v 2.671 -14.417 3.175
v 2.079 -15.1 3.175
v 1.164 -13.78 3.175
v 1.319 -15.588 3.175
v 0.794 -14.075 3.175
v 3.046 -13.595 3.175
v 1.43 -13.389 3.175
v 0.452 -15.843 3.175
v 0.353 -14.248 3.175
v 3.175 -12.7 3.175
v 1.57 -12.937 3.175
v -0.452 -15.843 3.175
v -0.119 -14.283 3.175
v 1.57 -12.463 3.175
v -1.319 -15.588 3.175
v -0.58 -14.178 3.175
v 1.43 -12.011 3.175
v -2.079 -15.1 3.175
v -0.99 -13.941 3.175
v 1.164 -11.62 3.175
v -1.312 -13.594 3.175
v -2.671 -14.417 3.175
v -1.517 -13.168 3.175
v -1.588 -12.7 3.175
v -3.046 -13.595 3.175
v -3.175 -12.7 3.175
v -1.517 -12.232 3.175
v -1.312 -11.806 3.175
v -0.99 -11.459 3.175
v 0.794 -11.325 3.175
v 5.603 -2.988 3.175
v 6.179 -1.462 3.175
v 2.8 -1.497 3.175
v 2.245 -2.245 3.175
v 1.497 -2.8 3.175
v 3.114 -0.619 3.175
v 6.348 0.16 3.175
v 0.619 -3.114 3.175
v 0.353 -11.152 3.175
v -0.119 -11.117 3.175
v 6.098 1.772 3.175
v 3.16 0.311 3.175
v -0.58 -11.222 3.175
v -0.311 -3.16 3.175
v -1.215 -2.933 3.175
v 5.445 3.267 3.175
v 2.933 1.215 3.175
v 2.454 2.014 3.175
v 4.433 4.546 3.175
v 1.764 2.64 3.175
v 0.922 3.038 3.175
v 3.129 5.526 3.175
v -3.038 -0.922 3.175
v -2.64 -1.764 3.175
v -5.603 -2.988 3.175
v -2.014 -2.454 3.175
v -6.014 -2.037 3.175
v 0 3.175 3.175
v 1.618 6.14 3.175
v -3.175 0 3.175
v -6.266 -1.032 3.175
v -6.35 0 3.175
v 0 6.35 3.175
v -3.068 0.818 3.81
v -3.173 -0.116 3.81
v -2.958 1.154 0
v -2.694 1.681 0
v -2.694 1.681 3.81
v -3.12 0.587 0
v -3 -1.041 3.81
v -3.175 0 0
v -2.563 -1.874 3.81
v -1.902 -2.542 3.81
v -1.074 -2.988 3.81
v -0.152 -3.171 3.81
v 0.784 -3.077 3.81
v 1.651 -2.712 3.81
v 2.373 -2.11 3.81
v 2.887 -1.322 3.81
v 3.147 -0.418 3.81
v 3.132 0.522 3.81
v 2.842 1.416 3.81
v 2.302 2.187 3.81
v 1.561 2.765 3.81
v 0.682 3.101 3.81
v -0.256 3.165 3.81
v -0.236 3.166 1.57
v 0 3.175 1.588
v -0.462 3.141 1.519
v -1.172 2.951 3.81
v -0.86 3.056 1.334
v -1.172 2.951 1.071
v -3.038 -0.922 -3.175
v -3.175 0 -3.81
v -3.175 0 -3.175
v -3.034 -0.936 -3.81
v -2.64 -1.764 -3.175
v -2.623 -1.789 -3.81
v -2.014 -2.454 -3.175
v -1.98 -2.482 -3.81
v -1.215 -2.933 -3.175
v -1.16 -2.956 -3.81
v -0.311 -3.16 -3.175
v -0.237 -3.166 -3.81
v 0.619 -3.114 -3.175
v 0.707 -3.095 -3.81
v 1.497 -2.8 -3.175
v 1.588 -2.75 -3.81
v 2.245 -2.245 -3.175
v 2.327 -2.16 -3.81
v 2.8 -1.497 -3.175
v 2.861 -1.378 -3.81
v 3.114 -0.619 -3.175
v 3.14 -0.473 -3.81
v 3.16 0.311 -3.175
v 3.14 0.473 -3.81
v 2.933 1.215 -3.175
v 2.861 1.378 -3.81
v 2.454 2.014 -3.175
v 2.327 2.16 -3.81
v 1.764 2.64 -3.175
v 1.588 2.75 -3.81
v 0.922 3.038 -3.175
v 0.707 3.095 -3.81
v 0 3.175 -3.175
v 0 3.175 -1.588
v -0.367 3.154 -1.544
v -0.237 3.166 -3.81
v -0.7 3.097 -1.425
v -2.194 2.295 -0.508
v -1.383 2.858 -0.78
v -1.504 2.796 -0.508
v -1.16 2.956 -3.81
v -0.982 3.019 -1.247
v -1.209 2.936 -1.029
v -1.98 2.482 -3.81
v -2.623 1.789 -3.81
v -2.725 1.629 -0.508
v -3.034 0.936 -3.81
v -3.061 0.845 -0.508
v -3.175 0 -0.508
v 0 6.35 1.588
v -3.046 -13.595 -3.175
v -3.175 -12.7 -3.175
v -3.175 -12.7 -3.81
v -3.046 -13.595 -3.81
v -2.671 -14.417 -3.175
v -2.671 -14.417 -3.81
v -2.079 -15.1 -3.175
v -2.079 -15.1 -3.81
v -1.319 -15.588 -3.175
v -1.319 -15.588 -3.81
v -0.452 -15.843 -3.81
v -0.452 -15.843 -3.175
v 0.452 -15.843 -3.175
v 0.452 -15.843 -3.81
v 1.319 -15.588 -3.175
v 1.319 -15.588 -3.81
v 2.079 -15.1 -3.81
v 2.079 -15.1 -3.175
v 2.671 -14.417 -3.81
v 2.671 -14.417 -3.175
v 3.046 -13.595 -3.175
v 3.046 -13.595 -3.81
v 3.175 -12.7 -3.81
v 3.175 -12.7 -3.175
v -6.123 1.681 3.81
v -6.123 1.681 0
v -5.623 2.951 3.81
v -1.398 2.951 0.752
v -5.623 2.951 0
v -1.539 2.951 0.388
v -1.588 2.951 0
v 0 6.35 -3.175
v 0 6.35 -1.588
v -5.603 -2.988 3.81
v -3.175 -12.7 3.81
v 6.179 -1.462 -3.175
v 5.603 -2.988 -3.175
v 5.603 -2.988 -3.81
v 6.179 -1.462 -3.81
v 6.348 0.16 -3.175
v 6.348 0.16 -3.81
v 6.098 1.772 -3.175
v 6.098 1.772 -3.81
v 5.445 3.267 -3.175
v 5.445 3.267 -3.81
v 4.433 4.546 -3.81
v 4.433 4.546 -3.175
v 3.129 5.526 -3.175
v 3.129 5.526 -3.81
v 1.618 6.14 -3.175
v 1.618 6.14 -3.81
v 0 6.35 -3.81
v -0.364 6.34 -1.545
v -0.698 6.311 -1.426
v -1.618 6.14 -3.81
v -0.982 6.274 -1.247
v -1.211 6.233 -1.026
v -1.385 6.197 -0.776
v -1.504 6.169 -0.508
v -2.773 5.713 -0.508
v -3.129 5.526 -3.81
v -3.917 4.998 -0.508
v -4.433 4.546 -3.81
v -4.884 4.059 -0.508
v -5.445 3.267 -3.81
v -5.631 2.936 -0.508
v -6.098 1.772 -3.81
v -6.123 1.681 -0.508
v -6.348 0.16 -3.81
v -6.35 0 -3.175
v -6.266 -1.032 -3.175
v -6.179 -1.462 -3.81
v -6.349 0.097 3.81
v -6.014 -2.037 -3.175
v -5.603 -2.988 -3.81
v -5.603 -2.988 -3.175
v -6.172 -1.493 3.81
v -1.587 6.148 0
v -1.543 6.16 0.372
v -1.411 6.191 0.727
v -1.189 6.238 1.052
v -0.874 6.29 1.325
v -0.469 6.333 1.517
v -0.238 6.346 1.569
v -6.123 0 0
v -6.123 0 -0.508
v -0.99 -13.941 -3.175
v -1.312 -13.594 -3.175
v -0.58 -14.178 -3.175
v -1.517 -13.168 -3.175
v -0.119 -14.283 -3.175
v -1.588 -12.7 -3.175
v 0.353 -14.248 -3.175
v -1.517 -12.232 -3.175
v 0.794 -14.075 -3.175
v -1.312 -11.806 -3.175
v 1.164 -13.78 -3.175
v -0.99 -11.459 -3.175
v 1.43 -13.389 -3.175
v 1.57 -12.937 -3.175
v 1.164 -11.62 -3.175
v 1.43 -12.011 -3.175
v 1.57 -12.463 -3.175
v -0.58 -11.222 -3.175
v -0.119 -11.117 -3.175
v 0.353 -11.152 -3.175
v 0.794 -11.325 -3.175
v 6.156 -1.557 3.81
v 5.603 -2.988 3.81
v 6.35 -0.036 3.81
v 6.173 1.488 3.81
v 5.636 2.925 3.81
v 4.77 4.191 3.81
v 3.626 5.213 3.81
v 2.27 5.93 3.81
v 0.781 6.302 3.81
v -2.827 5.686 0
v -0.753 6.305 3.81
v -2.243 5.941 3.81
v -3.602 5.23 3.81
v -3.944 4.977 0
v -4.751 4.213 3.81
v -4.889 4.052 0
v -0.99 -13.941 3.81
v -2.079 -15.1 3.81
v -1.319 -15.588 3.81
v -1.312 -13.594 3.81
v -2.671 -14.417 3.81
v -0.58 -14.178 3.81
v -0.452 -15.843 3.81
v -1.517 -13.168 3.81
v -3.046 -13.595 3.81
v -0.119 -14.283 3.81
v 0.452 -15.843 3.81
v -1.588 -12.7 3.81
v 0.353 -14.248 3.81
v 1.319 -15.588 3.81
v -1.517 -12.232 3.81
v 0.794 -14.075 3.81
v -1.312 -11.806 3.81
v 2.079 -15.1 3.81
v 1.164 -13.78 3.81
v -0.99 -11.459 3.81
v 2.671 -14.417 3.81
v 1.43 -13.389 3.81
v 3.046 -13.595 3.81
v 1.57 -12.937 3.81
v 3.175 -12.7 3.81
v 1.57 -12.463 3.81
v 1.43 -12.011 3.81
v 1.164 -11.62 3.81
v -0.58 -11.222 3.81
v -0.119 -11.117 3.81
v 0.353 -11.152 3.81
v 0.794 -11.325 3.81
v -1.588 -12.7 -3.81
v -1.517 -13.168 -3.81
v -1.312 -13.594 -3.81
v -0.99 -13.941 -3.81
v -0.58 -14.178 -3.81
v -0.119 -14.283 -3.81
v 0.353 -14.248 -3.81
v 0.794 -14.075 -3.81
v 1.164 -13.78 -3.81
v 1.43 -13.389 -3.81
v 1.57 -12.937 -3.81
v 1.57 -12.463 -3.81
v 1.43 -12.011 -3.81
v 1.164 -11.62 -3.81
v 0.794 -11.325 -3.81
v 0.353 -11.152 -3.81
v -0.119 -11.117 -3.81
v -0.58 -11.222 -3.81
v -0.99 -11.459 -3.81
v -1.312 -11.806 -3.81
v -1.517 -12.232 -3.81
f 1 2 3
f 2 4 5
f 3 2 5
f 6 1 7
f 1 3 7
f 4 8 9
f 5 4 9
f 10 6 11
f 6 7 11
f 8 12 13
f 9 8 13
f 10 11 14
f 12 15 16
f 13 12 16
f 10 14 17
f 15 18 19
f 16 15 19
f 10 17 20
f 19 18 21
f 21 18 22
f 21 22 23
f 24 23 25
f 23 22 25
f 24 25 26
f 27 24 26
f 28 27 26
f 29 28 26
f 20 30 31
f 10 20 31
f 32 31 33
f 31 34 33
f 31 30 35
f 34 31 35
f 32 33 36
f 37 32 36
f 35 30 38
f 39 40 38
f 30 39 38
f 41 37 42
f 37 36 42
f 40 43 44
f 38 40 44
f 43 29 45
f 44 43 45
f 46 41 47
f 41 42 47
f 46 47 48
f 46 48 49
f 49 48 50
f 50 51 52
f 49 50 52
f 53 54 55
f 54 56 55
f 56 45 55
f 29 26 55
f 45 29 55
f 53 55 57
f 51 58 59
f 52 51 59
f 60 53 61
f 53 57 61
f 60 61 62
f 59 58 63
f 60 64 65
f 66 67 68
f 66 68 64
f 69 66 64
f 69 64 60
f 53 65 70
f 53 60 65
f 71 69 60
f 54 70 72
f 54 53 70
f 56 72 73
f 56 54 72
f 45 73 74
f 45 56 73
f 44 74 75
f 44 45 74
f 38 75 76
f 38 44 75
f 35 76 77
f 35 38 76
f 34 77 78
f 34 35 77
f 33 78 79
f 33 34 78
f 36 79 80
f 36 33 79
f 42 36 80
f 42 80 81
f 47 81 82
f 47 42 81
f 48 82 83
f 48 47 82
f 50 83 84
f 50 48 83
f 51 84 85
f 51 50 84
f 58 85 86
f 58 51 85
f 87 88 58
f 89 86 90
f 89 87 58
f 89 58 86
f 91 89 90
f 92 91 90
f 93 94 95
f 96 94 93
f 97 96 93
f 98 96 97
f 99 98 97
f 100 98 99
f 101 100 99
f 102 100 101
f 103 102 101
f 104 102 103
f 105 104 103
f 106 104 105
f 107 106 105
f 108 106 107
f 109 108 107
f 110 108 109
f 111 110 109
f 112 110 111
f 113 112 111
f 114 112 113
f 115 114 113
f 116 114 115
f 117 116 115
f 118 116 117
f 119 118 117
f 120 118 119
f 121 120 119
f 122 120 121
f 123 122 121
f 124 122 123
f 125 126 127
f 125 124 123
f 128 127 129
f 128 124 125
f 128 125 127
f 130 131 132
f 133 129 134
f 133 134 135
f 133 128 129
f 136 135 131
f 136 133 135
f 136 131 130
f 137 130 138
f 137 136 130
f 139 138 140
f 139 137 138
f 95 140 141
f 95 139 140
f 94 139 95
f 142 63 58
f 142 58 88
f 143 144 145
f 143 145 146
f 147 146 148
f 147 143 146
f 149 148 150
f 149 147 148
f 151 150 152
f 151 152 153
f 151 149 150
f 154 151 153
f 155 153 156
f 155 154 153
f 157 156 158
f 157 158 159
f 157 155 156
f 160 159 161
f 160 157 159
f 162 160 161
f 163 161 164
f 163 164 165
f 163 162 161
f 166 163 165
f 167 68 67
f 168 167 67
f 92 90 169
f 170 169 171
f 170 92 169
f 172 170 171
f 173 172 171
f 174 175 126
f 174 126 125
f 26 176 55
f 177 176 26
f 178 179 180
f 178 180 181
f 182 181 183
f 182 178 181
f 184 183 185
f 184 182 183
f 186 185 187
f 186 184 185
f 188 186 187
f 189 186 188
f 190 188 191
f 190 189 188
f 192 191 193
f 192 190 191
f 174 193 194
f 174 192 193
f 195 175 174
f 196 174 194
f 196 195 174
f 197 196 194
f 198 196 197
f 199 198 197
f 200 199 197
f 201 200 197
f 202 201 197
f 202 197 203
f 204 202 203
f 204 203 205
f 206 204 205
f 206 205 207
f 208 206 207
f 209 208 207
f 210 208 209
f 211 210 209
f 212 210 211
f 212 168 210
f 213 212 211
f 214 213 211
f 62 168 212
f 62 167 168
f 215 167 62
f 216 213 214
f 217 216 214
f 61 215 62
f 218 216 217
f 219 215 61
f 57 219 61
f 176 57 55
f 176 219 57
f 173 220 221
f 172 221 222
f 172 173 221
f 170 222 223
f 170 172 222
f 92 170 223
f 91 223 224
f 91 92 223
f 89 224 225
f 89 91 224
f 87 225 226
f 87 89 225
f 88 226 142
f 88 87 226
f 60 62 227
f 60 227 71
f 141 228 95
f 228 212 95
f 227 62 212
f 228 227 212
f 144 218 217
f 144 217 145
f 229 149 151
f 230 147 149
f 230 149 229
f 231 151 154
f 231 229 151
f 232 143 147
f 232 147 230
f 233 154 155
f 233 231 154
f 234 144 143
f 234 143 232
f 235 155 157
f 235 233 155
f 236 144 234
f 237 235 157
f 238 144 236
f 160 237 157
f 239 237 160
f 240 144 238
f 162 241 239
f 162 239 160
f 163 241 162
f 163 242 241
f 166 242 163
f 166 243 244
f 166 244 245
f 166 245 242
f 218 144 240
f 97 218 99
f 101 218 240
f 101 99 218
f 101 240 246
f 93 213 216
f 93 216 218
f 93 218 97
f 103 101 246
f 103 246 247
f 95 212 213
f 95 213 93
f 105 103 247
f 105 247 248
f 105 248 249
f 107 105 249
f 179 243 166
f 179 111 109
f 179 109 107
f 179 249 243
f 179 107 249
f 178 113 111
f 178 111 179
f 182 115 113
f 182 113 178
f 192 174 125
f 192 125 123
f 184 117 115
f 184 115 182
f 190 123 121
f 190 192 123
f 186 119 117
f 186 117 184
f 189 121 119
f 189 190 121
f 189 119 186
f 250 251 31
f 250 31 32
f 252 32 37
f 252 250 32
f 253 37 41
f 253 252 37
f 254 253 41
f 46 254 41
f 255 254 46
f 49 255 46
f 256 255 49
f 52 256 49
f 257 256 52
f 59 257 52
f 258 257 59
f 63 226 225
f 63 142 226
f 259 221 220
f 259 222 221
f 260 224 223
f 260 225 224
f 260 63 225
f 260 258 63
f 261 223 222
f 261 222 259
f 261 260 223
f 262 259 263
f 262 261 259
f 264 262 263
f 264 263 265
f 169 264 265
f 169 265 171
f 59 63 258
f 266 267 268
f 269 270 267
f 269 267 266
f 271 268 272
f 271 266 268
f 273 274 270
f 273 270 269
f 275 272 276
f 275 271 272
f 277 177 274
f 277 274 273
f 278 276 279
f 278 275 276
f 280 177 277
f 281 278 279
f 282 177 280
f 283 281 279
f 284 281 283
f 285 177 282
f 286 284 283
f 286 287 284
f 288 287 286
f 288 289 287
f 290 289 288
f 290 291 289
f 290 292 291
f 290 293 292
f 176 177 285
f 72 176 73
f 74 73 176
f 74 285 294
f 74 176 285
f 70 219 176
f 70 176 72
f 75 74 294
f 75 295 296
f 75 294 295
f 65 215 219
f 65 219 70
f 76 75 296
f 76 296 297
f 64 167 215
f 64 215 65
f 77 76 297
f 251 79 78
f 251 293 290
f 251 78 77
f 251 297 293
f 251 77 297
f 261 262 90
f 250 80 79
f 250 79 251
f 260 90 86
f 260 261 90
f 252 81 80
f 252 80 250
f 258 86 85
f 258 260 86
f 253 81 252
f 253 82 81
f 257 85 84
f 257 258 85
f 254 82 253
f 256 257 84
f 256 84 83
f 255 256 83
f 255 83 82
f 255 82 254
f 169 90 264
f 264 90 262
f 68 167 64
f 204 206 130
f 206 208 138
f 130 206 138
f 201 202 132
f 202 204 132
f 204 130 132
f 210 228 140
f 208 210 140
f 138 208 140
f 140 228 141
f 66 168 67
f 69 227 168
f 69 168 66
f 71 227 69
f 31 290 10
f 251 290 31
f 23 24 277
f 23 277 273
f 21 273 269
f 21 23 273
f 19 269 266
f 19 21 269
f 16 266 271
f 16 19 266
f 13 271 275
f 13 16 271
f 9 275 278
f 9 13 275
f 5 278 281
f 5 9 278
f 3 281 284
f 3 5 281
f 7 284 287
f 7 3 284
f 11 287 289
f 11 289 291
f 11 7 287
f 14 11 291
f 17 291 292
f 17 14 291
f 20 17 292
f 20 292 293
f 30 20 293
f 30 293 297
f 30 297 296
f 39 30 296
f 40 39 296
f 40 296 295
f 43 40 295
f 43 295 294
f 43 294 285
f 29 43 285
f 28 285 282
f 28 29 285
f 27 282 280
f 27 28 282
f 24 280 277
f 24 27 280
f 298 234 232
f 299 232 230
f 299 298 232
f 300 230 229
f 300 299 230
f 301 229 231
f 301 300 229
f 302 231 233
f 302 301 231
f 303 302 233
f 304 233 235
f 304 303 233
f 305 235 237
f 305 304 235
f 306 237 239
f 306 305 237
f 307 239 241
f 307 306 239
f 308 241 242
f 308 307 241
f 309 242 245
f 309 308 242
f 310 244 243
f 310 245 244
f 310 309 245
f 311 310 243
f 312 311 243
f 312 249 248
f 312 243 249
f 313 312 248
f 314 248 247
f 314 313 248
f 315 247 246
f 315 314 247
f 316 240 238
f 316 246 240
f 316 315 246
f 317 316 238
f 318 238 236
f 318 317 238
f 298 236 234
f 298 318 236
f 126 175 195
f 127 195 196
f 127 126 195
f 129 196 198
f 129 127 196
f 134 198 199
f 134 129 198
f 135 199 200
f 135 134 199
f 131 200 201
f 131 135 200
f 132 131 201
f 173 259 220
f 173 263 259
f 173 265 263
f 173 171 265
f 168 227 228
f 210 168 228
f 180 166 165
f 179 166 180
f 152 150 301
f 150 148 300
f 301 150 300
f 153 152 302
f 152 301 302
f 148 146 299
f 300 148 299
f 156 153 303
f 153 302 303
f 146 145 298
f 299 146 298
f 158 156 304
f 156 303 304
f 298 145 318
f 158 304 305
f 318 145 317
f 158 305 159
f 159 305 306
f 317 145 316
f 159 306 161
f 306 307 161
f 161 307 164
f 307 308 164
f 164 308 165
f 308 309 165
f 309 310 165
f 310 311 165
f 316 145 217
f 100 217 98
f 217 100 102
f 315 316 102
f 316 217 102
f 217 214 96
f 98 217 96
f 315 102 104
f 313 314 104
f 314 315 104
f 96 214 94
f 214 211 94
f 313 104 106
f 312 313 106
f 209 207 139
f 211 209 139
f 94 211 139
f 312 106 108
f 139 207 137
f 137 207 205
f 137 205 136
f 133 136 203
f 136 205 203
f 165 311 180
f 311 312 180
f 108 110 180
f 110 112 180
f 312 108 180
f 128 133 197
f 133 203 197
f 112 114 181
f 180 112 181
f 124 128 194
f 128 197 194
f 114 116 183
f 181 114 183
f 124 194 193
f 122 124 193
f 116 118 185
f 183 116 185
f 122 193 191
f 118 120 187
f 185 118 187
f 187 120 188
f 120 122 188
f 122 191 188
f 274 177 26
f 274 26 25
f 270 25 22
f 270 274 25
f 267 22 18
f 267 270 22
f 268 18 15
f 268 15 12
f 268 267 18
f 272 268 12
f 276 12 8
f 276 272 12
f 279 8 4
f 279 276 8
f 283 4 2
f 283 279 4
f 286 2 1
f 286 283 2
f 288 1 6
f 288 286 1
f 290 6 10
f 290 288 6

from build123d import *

# Parameters (mm, degrees)
CROQUIS1_R              = 3.175
CROQUIS1_R_2            = 1.5875
SALIENTE_EXTRUIR1_DEPTH = 3.81
CROQUIS2_W              = 12.70653568
CROQUIS2_H              = 6.35
CORTAR_EXTRUIR1_DEPTH   = 20.32
CROQUIS3_W              = 6.35
CROQUIS3_H              = 7.62
CORTAR_EXTRUIR2_DEPTH   = 20.32
CROQUIS4_W              = 3.81
CROQUIS4_H              = 1.27
CORTAR_EXTRUIR3_DEPTH   = 20.32
CROQUIS5_R              = 1.5875
CORTAR_EXTRUIR4_DEPTH   = 53.34
CORTAR_EXTRUIR6_DEPTH   = 53.34


with BuildPart() as part:
    # Croquis1 → Saliente-Extruir1 (new, symmetric)
    with BuildSketch(Plane.XY):
        with BuildLine():
            Line((-5.602941176, -2.988235294), (-3.175, -12.7))
            ThreePointArc((-3.175, -12.7), (0, -15.875), (3.175, -12.7))
            Line((3.175, -12.7), (5.602941176, -2.988235294))
            ThreePointArc((5.602941176, -2.988235294), (0, 6.35), (-5.602941176, -2.988235294))
        make_face()
        with Locations(Location((0, 0, 0), (0, 0, 180))):
            Circle(CROQUIS1_R, mode=Mode.SUBTRACT)
        with Locations(Location((0, -12.7, 0), (0, 0, 180))):
            Circle(CROQUIS1_R_2, mode=Mode.SUBTRACT)
    extrude(amount=SALIENTE_EXTRUIR1_DEPTH, both=True)

    # Croquis2 → Cortar-Extruir1 (cut)
    with BuildSketch(Plane(origin=(0, 0, 0), x_dir=(1, 0, 0), z_dir=(0, 1, 0))):
        with Locations((0.00326784, 0)):
            Rectangle(CROQUIS2_W, CROQUIS2_H)
    extrude(amount=-CORTAR_EXTRUIR1_DEPTH, mode=Mode.SUBTRACT)

    # Croquis3 → Cortar-Extruir2 (cut)
    with BuildSketch(Plane(origin=(0, 0, 0), x_dir=(0, 0, -1), z_dir=(1, 0, 0))):
        with Locations((0, 3.81)):
            Rectangle(CROQUIS3_W, CROQUIS3_H)
    extrude(amount=CORTAR_EXTRUIR2_DEPTH, mode=Mode.SUBTRACT)

    # Croquis4 → Cortar-Extruir3 (cut)
    with BuildSketch(Plane(origin=(0, 0, 0), x_dir=(0, 0, -1), z_dir=(1, 0, 0))):
        with Locations((-1.905, 2.315882353)):
            Rectangle(CROQUIS4_W, CROQUIS4_H)
    extrude(amount=-CORTAR_EXTRUIR3_DEPTH, mode=Mode.SUBTRACT)

    # Croquis5 → Cortar-Extruir4 (cut)
    with BuildSketch(Plane(origin=(0, 0, 0), x_dir=(1, 0, 0), z_dir=(0, 1, 0))):
        Circle(CROQUIS5_R)
    extrude(amount=CORTAR_EXTRUIR4_DEPTH, mode=Mode.SUBTRACT)

    # Croquis6 → Cortar-Extruir6 (cut)
    with BuildSketch(Plane(origin=(0, 0, 0), x_dir=(1, 0, 0), z_dir=(0, 1, 0))):
        Polygon((0, 0), (-5.622703384, 0), (-6.123490387, 0), (-6.123490387, 0.508), (0, 0.508), align=None)
    extrude(amount=CORTAR_EXTRUIR6_DEPTH, mode=Mode.SUBTRACT)


solid = part.part
